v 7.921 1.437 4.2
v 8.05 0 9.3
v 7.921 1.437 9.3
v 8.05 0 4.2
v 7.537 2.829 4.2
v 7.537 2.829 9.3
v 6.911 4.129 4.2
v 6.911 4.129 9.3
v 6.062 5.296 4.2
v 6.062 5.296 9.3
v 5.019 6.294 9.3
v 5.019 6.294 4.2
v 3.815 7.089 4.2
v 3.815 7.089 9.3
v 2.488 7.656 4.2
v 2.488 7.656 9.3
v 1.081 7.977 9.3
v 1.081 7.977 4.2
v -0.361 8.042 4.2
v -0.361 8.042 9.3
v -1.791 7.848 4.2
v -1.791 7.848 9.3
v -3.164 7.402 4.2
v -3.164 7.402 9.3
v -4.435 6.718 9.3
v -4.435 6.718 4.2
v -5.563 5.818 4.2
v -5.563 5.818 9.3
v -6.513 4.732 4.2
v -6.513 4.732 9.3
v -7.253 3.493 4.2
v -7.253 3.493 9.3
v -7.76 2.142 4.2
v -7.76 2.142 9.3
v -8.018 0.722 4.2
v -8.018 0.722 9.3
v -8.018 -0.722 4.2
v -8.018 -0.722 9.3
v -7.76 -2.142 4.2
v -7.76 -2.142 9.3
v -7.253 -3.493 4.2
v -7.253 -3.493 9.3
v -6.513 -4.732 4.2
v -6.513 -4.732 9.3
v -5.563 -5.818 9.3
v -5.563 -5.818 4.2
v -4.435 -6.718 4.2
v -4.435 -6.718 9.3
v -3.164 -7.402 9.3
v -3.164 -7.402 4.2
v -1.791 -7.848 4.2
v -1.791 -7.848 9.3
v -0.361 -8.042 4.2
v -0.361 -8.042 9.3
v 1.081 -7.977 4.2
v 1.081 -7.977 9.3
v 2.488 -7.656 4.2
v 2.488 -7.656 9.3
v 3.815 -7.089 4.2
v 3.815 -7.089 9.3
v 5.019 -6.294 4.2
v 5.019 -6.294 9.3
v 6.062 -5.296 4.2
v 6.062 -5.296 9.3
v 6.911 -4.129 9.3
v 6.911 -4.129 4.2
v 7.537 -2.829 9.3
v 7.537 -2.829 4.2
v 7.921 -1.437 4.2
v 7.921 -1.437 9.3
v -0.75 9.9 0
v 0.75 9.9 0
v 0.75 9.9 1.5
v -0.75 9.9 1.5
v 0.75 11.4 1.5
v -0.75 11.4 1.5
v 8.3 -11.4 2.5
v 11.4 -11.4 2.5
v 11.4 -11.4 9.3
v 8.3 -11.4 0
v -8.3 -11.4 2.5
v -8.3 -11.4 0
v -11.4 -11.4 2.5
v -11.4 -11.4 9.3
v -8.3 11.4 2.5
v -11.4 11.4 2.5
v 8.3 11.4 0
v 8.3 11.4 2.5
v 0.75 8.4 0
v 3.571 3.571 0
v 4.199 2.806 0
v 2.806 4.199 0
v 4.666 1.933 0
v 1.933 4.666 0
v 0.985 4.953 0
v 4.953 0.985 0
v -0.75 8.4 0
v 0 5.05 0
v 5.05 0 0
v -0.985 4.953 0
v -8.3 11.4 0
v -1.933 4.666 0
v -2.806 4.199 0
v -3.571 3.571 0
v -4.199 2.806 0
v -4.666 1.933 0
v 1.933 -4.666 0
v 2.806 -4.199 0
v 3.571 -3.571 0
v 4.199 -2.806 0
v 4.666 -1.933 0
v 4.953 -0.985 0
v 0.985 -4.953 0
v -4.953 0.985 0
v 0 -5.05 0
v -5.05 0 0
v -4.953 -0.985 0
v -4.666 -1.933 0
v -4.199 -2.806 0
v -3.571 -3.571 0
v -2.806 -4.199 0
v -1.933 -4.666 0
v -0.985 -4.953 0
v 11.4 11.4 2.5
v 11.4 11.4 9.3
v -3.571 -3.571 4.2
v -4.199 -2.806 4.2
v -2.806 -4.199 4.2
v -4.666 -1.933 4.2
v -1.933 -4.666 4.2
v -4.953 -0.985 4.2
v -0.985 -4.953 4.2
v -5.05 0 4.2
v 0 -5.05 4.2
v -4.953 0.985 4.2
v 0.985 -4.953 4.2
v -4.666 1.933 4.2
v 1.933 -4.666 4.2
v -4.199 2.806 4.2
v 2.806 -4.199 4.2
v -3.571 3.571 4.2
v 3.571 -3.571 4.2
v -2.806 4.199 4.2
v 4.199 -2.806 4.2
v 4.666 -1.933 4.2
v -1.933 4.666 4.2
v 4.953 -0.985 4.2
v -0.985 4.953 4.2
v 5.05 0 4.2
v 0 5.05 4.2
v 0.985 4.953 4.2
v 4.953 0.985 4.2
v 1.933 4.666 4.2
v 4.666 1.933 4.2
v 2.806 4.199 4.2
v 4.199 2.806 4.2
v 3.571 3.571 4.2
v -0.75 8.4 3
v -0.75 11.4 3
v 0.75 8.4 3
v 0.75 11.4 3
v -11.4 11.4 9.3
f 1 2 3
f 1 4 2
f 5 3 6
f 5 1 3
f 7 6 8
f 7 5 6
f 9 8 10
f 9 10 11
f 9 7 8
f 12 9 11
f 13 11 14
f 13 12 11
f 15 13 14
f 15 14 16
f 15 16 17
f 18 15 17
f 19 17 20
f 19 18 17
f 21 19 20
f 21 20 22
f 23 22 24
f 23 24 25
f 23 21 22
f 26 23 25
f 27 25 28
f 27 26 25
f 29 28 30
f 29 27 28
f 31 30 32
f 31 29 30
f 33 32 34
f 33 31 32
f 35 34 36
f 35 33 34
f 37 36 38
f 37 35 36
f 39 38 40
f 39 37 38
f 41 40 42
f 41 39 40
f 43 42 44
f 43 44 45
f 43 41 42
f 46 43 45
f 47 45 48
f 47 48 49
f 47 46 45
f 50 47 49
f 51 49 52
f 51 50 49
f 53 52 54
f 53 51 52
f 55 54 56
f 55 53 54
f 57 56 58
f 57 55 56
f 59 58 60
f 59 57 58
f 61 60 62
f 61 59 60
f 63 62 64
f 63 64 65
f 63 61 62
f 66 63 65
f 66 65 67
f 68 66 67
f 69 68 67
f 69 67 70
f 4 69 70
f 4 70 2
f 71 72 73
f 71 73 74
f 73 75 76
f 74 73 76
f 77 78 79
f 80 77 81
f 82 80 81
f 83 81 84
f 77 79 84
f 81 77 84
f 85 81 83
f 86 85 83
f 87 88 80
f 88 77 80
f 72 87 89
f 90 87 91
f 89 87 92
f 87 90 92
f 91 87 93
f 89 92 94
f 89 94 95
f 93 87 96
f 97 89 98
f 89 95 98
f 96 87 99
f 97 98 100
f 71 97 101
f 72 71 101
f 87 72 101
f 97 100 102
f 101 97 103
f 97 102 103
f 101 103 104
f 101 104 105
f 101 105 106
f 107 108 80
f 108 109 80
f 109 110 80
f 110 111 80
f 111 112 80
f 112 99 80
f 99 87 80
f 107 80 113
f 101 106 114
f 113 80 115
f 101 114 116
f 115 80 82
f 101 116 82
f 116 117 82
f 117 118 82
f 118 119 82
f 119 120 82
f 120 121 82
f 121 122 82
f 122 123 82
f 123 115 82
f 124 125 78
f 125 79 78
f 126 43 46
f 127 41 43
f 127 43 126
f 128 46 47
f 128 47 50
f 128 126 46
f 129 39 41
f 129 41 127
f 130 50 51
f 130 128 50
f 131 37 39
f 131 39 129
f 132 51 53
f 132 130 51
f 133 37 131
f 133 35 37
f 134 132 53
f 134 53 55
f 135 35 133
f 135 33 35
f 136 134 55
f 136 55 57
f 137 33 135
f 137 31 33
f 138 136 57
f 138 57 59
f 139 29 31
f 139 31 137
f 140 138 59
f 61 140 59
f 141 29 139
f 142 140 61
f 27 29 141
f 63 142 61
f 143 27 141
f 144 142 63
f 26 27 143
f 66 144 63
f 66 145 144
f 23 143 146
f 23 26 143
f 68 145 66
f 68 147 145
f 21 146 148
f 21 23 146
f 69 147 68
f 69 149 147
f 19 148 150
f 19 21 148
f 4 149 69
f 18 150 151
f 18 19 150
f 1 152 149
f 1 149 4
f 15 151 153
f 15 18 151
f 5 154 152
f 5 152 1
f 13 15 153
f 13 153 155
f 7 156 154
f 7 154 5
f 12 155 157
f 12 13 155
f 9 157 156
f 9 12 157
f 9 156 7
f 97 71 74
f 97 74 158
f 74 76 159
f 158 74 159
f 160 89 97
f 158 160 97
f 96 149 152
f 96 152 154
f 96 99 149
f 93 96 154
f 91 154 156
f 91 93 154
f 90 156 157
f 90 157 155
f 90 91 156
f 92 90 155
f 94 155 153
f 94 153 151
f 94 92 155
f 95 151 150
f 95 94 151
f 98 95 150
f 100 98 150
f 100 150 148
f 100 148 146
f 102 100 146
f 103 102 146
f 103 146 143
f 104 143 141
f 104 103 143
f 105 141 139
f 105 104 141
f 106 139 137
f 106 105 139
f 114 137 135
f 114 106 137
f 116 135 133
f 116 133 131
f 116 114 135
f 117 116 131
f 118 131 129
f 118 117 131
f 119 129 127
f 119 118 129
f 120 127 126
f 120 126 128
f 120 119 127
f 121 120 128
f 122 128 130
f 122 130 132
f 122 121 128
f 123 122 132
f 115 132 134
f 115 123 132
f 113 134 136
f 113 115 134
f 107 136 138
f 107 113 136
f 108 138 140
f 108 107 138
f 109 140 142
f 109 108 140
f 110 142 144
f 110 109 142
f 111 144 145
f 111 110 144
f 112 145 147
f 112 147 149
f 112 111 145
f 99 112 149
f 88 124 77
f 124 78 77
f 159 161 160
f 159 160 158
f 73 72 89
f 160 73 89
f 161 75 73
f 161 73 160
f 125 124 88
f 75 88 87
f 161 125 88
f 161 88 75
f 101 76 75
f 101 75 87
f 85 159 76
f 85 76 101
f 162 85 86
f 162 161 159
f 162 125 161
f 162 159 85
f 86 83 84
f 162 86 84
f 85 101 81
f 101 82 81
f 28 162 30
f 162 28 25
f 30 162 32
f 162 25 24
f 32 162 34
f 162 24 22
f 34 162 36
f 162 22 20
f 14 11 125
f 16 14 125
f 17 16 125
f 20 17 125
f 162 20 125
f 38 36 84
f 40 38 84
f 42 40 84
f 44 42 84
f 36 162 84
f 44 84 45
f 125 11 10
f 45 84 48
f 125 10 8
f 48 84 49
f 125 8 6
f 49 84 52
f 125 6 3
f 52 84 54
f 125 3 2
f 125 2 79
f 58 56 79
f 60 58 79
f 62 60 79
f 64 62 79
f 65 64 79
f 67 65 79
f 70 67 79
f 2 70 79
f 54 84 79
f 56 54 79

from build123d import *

# Parameters (mm, degrees)
PAD_DEPTH       = 11.4
SKETCH002_W     = 1.5
SKETCH002_H     = 1.5
POCKET_DEPTH    = 3
SKETCH003_W     = 1.5
SKETCH003_H     = 1.5
POCKET001_DEPTH = 3


with BuildPart() as part:
    # Sketch → Pad (new body, symmetric)
    with BuildSketch(Plane.XZ):
        Polygon((-11.4, 9.3), (11.4, 9.3), (11.4, 2.5), (8.3, 2.5), (8.3, 0), (-8.3, 0), (-8.3, 2.5), (-11.4, 2.5), align=None)
    extrude(amount=PAD_DEPTH, both=True)

    # Sketch001 → Groove (revolve, cut)
    with BuildSketch(Plane.XZ):
        Polygon((0, 9.3), (8.05, 9.3), (8.05, 4.2), (5.05, 4.2), (5.05, 0), (0, 0), align=None)
    revolve(axis=Axis((0, 0, 0), (0, 0, 1)), mode=Mode.SUBTRACT)

    # Sketch002 → Pocket (cut)
    with BuildSketch(Plane(origin=(0, 0, 0), x_dir=(-1, 0, 0), z_dir=(0, 0, -1))):
        with Locations((0, 9.15)):
            Rectangle(SKETCH002_W, SKETCH002_H)
    extrude(amount=-POCKET_DEPTH, mode=Mode.SUBTRACT)

    # Sketch003 → Pocket001 (cut)
    with BuildSketch(Plane(origin=(0, 11.4, 0), x_dir=(-1, 0, 0), z_dir=(0, 1, 0))):
        with Locations((0, 2.25)):
            Rectangle(SKETCH003_W, SKETCH003_H)
    extrude(amount=-POCKET001_DEPTH, mode=Mode.SUBTRACT)


solid = part.part
